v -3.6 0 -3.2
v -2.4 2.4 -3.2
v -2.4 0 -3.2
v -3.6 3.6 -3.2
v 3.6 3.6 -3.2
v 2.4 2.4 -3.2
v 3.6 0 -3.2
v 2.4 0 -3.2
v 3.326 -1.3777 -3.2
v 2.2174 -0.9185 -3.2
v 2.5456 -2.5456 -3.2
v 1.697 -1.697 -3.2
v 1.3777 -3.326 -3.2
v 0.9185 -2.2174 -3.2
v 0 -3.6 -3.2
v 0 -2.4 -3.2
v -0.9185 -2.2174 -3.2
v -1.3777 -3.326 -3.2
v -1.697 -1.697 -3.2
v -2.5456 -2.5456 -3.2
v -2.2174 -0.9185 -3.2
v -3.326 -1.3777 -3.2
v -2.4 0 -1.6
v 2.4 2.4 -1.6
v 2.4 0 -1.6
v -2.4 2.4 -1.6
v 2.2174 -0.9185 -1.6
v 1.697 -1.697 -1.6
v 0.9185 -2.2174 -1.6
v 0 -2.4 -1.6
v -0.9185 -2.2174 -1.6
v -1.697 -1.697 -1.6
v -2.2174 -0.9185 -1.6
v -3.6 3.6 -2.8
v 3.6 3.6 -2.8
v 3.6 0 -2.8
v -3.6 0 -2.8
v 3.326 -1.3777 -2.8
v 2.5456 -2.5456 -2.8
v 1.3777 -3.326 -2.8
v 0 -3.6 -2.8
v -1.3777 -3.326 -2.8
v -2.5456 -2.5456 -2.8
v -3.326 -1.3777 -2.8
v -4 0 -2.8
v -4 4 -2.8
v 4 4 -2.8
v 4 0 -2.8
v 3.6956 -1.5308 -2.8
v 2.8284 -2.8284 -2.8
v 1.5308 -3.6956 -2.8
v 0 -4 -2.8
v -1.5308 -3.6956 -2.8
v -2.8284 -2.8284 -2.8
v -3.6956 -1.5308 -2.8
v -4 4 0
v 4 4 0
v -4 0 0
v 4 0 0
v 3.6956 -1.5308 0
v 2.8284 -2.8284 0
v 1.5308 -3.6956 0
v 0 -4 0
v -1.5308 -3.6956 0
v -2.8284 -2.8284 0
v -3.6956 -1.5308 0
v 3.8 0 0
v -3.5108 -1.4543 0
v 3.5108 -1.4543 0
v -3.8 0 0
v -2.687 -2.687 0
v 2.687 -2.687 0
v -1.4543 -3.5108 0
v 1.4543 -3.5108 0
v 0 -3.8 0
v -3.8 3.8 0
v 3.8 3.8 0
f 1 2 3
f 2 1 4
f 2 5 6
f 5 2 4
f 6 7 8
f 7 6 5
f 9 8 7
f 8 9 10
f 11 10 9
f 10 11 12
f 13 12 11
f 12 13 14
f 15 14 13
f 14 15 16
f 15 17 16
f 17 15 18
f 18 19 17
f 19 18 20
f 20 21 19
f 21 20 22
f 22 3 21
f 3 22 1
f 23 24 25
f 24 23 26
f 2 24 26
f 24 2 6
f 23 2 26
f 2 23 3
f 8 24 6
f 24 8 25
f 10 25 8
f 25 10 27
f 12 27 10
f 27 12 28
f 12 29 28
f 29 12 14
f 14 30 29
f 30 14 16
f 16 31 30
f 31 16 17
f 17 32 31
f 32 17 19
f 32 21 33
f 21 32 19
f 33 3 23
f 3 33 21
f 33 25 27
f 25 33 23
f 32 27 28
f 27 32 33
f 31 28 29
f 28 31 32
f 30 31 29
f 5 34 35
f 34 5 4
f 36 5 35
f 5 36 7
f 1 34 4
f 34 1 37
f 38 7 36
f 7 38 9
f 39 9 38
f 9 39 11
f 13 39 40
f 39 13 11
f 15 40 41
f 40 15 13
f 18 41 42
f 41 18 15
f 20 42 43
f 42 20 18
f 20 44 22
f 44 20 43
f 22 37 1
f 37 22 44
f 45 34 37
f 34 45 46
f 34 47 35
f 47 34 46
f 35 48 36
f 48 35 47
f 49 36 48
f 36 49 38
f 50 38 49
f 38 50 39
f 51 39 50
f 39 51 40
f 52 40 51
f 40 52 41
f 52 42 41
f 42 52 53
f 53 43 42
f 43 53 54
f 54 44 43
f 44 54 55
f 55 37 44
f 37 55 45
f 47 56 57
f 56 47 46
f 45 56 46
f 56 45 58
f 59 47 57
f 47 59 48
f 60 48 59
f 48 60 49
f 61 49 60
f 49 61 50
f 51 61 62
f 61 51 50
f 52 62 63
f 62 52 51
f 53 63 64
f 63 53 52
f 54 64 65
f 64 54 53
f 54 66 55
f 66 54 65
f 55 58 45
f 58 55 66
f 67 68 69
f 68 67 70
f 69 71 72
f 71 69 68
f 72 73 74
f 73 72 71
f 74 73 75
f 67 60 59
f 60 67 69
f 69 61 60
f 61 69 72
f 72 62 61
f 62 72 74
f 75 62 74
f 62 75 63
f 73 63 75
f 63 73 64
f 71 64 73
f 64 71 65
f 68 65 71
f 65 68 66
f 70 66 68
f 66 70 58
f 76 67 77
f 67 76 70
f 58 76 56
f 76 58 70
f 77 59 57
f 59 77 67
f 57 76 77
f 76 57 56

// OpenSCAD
// file: ../p/2-4edge.scad
use <../lib.scad>
function ldraw_lib__2_4edge() = [
// 0 Circle 0.5
// 0 Name: 2-4edge.dat
// 0 Author: James Jessiman
// 0 !LDRAW_ORG Primitive UPDATE 2017-01
// 0 !LICENSE Licensed under CC BY 4.0 : see CAreadme.txt
// 
// 0 BFC CERTIFY CCW
  [0,"BFC","CERTIFY"],
  [0,"BFC","CCW"],
// 
// 0 !HISTORY 2007-06-24 [PTadmin] Header formatted for Contributor Agreement
// 0 !HISTORY 2008-07-01 [PTadmin] Official Update 2008-01
// 0 !HISTORY 2017-01-15 [Steffen] BFCed
// 0 !HISTORY 2017-12-30 [PTadmin] Official Update 2017-01
// 
// 
// 2 24 1 0 0 0.9239 0 0.3827
  [2,24,1,0,0,0.9239,0,0.3827],
// 2 24 0.9239 0 0.3827 0.7071 0 0.7071
  [2,24,0.9239,0,0.3827,0.7071,0,0.7071],
// 2 24 0.7071 0 0.7071 0.3827 0 0.9239
  [2,24,0.7071,0,0.7071,0.3827,0,0.9239],
// 2 24 0.3827 0 0.9239 0 0 1
  [2,24,0.3827,0,0.9239,0,0,1],
// 2 24 0 0 1 -0.3827 0 0.9239
  [2,24,0,0,1,-0.3827,0,0.9239],
// 2 24 -0.3827 0 0.9239 -0.7071 0 0.7071
  [2,24,-0.3827,0,0.9239,-0.7071,0,0.7071],
// 2 24 -0.7071 0 0.7071 -0.9239 0 0.3827
  [2,24,-0.7071,0,0.7071,-0.9239,0,0.3827],
// 2 24 -0.9239 0 0.3827 -1 0 0
  [2,24,-0.9239,0,0.3827,-1,0,0],
];
module ldraw_lib__2_4edge(step=0, col=false, unit=2/5, alt=false, line=0.2, solid=!$preview)
    makepoly(ldraw_lib__2_4edge(), step=step, col=col, unit=unit, alt=alt, line=line, solid=solid);
ldraw_lib__2_4edge(line=0.2);
// file: ../p/2-4cyli.scad
use <../lib.scad>
function ldraw_lib__2_4cyli() = [
// 0 Cylinder 0.5
// 0 Name: 2-4cyli.dat
// 0 Author: James Jessiman
// 0 !LDRAW_ORG Primitive UPDATE 2005-01
// 0 !LICENSE Licensed under CC BY 4.0 : see CAreadme.txt
// 
// 0 BFC CERTIFY CCW
  [0,"BFC","CERTIFY"],
  [0,"BFC","CCW"],
// 
// 0 !HISTORY 2002-03-23 [sbliss] Added BFC statement; compacted code
// 0 !HISTORY 2002-04-25 [PTadmin] Official Update 2002-02
// 0 !HISTORY 2004-12-11 [nielsk] Recreated using Primitive Generator, Edge lines fixed, BFC changed to CCW
// 0 !HISTORY 2005-12-28 [PTadmin] Official Update 2005-01
// 0 !HISTORY 2007-06-24 [PTadmin] Header formatted for Contributor Agreement
// 0 !HISTORY 2008-07-01 [PTadmin] Official Update 2008-01
// 
// 
// 4 16 .9239 1 .3827 .9239 0 .3827 1 0 0 1 1 0
  [4,16,.9239,1,.3827,.9239,0,.3827,1,0,0,1,1,0],
// 4 16 .7071 1 .7071 .7071 0 .7071 .9239 0 .3827 .9239 1 .3827
  [4,16,.7071,1,.7071,.7071,0,.7071,.9239,0,.3827,.9239,1,.3827],
// 4 16 .3827 1 .9239 .3827 0 .9239 .7071 0 .7071 .7071 1 .7071
  [4,16,.3827,1,.9239,.3827,0,.9239,.7071,0,.7071,.7071,1,.7071],
// 4 16 0 1 1 0 0 1 .3827 0 .9239 .3827 1 .9239
  [4,16,0,1,1,0,0,1,.3827,0,.9239,.3827,1,.9239],
// 4 16 -.3827 1 .9239 -.3827 0 .9239 0 0 1 0 1 1
  [4,16,-.3827,1,.9239,-.3827,0,.9239,0,0,1,0,1,1],
// 4 16 -.7071 1 .7071 -.7071 0 .7071 -.3827 0 .9239 -.3827 1 .9239
  [4,16,-.7071,1,.7071,-.7071,0,.7071,-.3827,0,.9239,-.3827,1,.9239],
// 4 16 -.9239 1 .3827 -.9239 0 .3827 -.7071 0 .7071 -.7071 1 .7071
  [4,16,-.9239,1,.3827,-.9239,0,.3827,-.7071,0,.7071,-.7071,1,.7071],
// 4 16 -1 1 0 -1 0 0 -.9239 0 .3827 -.9239 1 .3827
  [4,16,-1,1,0,-1,0,0,-.9239,0,.3827,-.9239,1,.3827],
// 5 24 1 1 0 1 0 0 1 1 -.4142 .9239 1 .3827
  [5,24,1,1,0,1,0,0,1,1,-.4142,.9239,1,.3827],
// 5 24 .9239 1 .3827 .9239 0 .3827 1 1 0 .7071 1 .7071
  [5,24,.9239,1,.3827,.9239,0,.3827,1,1,0,.7071,1,.7071],
// 5 24 .7071 1 .7071 .7071 0 .7071 .9239 1 .3827 .3827 1 .9239
  [5,24,.7071,1,.7071,.7071,0,.7071,.9239,1,.3827,.3827,1,.9239],
// 5 24 .3827 1 .9239 .3827 0 .9239 .7071 1 .7071 0 1 1
  [5,24,.3827,1,.9239,.3827,0,.9239,.7071,1,.7071,0,1,1],
// 5 24 0 1 1 0 0 1 .3827 1 .9239 -.3827 1 .9239
  [5,24,0,1,1,0,0,1,.3827,1,.9239,-.3827,1,.9239],
// 5 24 -.3827 1 .9239 -.3827 0 .9239 0 1 1 -.7071 1 .7071
  [5,24,-.3827,1,.9239,-.3827,0,.9239,0,1,1,-.7071,1,.7071],
// 5 24 -.7071 1 .7071 -.7071 0 .7071 -.3827 1 .9239 -.9239 1 .3827
  [5,24,-.7071,1,.7071,-.7071,0,.7071,-.3827,1,.9239,-.9239,1,.3827],
// 5 24 -.9239 1 .3827 -.9239 0 .3827 -.7071 1 .7071 -1 1 0
  [5,24,-.9239,1,.3827,-.9239,0,.3827,-.7071,1,.7071,-1,1,0],
// 5 24 -1 1 0 -1 0 0 -.9239 1 .3827 -1 1 -.4142
  [5,24,-1,1,0,-1,0,0,-.9239,1,.3827,-1,1,-.4142],
// 0
];
module ldraw_lib__2_4cyli(step=0, col=false, unit=2/5, alt=false, line=0.2, solid=!$preview)
    makepoly(ldraw_lib__2_4cyli(), step=step, col=col, unit=unit, alt=alt, line=line, solid=solid);
ldraw_lib__2_4cyli(line=0.2);
// file: ../p/box4-4a.scad
use <../lib.scad>
function ldraw_lib__box4_4a() = [
// 0 Box with  4 Faces without  4 Adjacent Edges
// 0 Name: box4-4a.dat
// 0 Author: Willy Tschager [Holly-Wood]
// 0 !LDRAW_ORG Primitive UPDATE 2024-01
// 0 !LICENSE Licensed under CC BY 4.0 : see CAreadme.txt
// 
// 0 BFC CERTIFY CCW
  [0,"BFC","CERTIFY"],
  [0,"BFC","CCW"],
// 
// 0 !HISTORY 1998-07-15 [PTadmin] Official Update 1998-07
// 0 !HISTORY 2002-12-13 [hafhead] Made BFC compliant
// 0 !HISTORY 2003-03-12 [PTadmin] Official Update 2003-01
// 0 !HISTORY 2007-06-24 [PTadmin] Header formatted for Contributor Agreement
// 0 !HISTORY 2008-07-01 [PTadmin] Official Update 2008-01
// 0 !HISTORY 2012-02-16 [Philo] Changed to CCW
// 0 !HISTORY 2012-03-30 [PTadmin] Official Update 2012-01
// 0 !HISTORY 2024-01-03 [Holly-Wood] Complete re-write, original by Manfred Moolhuysen
// 0 !HISTORY 2024-01-29 [OrionP] Official Update 2024-01
// 
// 2 24 -1 1 -1 -1 1 1
  [2,24,-1,1,-1,-1,1,1],
// 2 24 1 1 1 1 1 -1
  [2,24,1,1,1,1,1,-1],
// 2 24 -1 1 1 1 1 1
  [2,24,-1,1,1,1,1,1],
// 4 16 1 1 1 1 1 -1 -1 1 -1 -1 1 1
  [4,16,1,1,1,1,1,-1,-1,1,-1,-1,1,1],
// 
// 2 24 -1 0 -1 -1 0 1
  [2,24,-1,0,-1,-1,0,1],
// 4 16 -1 1 1 -1 1 -1 -1 0 -1 -1 0 1
  [4,16,-1,1,1,-1,1,-1,-1,0,-1,-1,0,1],
// 
// 2 24 1 0 1 1 0 -1
  [2,24,1,0,1,1,0,-1],
// 4 16 1 1 -1 1 1 1 1 0 1 1 0 -1
  [4,16,1,1,-1,1,1,1,1,0,1,1,0,-1],
// 
// 2 24 1 1 1 1 0 1
  [2,24,1,1,1,1,0,1],
// 2 24 -1 1 1 -1 0 1
  [2,24,-1,1,1,-1,0,1],
// 2 24 -1 0 1 1 0 1
  [2,24,-1,0,1,1,0,1],
// 4 16 1 1 1 -1 1 1 -1 0 1 1 0 1
  [4,16,1,1,1,-1,1,1,-1,0,1,1,0,1],
];
module ldraw_lib__box4_4a(step=0, col=false, unit=2/5, alt=false, line=0.2, solid=!$preview)
    makepoly(ldraw_lib__box4_4a(), step=step, col=col, unit=unit, alt=alt, line=line, solid=solid);
ldraw_lib__box4_4a(line=0.2);
// file: ../p/box3u4a.scad
use <../lib.scad>
function ldraw_lib__box3u4a() = [
// 0 Box with 3 Faces without 4 Adjacent Edges
// 0 Name: box3u4a.dat
// 0 Author: Niels Karsdorp [nielsk]
// 0 !LDRAW_ORG Primitive UPDATE 2009-01
// 0 !LICENSE Licensed under CC BY 4.0 : see CAreadme.txt
// 
// 0 BFC CERTIFY CCW
  [0,"BFC","CERTIFY"],
  [0,"BFC","CCW"],
// 
// 0 !HISTORY 2009-05-02 [PTadmin] Official Update 2009-01
// 
// 
// 2 24 1 1 1 -1 1 1
  [2,24,1,1,1,-1,1,1],
// 2 24 -1 1 -1 1 1 -1
  [2,24,-1,1,-1,1,1,-1],
// 2 24 1 1 1 1 1 -1
  [2,24,1,1,1,1,1,-1],
// 2 24 -1 1 1 -1 1 -1
  [2,24,-1,1,1,-1,1,-1],
// 2 24 1 1 1 1 0 1
  [2,24,1,1,1,1,0,1],
// 2 24 1 1 -1 1 0 -1
  [2,24,1,1,-1,1,0,-1],
// 2 24 -1 1 1 -1 0 1
  [2,24,-1,1,1,-1,0,1],
// 2 24 -1 1 -1 -1 0 -1
  [2,24,-1,1,-1,-1,0,-1],
// 4 16 -1 1 -1 -1 1 1 1 1 1 1 1 -1
  [4,16,-1,1,-1,-1,1,1,1,1,1,1,1,-1],
// 4 16 -1 1 1 -1 0 1 1 0 1 1 1 1
  [4,16,-1,1,1,-1,0,1,1,0,1,1,1,1],
// 4 16 1 1 -1 1 0 -1 -1 0 -1 -1 1 -1
  [4,16,1,1,-1,1,0,-1,-1,0,-1,-1,1,-1],
// 0
];
module ldraw_lib__box3u4a(step=0, col=false, unit=2/5, alt=false, line=0.2, solid=!$preview)
    makepoly(ldraw_lib__box3u4a(), step=step, col=col, unit=unit, alt=alt, line=line, solid=solid);
ldraw_lib__box3u4a(line=0.2);
// file: ../p/2-4ring9.scad
use <../lib.scad>
function ldraw_lib__2_4ring9() = [
// 0 Ring  9 x 0.5
// 0 Name: 2-4ring9.dat
// 0 Author: Willy Tschager [Holly-Wood]
// 0 !LDRAW_ORG Primitive UPDATE 2024-01
// 0 !LICENSE Licensed under CC BY 4.0 : see CAreadme.txt
// 
// 0 BFC CERTIFY CCW
  [0,"BFC","CERTIFY"],
  [0,"BFC","CCW"],
// 
// 0 !HISTORY 2009-09-03 [PTadmin] Official Update 2009-02
// 0 !HISTORY 2024-01-10 [Holly-Wood] Complete regeneration, original by guyvivan
// 0 !HISTORY 2024-01-29 [OrionP] Official Update 2024-01
// 
// 4 16 10 0 0 9.239 0 3.827 8.3151 0 3.4443 9 0 0
  [4,16,10,0,0,9.239,0,3.827,8.3151,0,3.4443,9,0,0],
// 4 16 9.239 0 3.827 7.071 0 7.071 6.3639 0 6.3639 8.3151 0 3.4443
  [4,16,9.239,0,3.827,7.071,0,7.071,6.3639,0,6.3639,8.3151,0,3.4443],
// 4 16 7.071 0 7.071 3.827 0 9.239 3.4443 0 8.3151 6.3639 0 6.3639
  [4,16,7.071,0,7.071,3.827,0,9.239,3.4443,0,8.3151,6.3639,0,6.3639],
// 4 16 3.827 0 9.239 0 0 10 0 0 9 3.4443 0 8.3151
  [4,16,3.827,0,9.239,0,0,10,0,0,9,3.4443,0,8.3151],
// 4 16 0 0 10 -3.827 0 9.239 -3.4443 0 8.3151 0 0 9
  [4,16,0,0,10,-3.827,0,9.239,-3.4443,0,8.3151,0,0,9],
// 4 16 -3.827 0 9.239 -7.071 0 7.071 -6.3639 0 6.3639 -3.4443 0 8.3151
  [4,16,-3.827,0,9.239,-7.071,0,7.071,-6.3639,0,6.3639,-3.4443,0,8.3151],
// 4 16 -7.071 0 7.071 -9.239 0 3.827 -8.3151 0 3.4443 -6.3639 0 6.3639
  [4,16,-7.071,0,7.071,-9.239,0,3.827,-8.3151,0,3.4443,-6.3639,0,6.3639],
// 4 16 -9.239 0 3.827 -10 0 0 -9 0 0 -8.3151 0 3.4443
  [4,16,-9.239,0,3.827,-10,0,0,-9,0,0,-8.3151,0,3.4443],
// 0 // Build by LDPartEditor (PrimGen 2.X)
];
module ldraw_lib__2_4ring9(step=0, col=false, unit=2/5, alt=false, line=0.2, solid=!$preview)
    makepoly(ldraw_lib__2_4ring9(), step=step, col=col, unit=unit, alt=alt, line=line, solid=solid);
ldraw_lib__2_4ring9(line=0.2);
// file: ../p/2-4ring2.scad
use <../lib.scad>
function ldraw_lib__2_4ring2() = [
// 0 Ring  2 x 0.5
// 0 Name: 2-4ring2.dat
// 0 Author: Chris Dee [cwdee]
// 0 !LDRAW_ORG Primitive UPDATE 2012-01
// 0 !LICENSE Licensed under CC BY 4.0 : see CAreadme.txt
// 
// 0 BFC CERTIFY CCW
  [0,"BFC","CERTIFY"],
  [0,"BFC","CCW"],
// 
// 0 !HISTORY 2001-10-26 [PTadmin] Official Update 2001-01
// 0 !HISTORY 2007-06-24 [PTadmin] Header formatted for Contributor Agreement
// 0 !HISTORY 2008-07-01 [PTadmin] Official Update 2008-01
// 0 !HISTORY 2012-02-16 [Philo] Changed to CCW
// 0 !HISTORY 2012-03-30 [PTadmin] Official Update 2012-01
// 
// 
// 4 16 3 0 0 2.7717 0 1.1481 1.8478 0 0.7654 2 0 0
  [4,16,3,0,0,2.7717,0,1.1481,1.8478,0,0.7654,2,0,0],
// 4 16 2.7717 0 1.1481 2.1213 0 2.1213 1.4142 0 1.4142 1.8478 0 0.7654
  [4,16,2.7717,0,1.1481,2.1213,0,2.1213,1.4142,0,1.4142,1.8478,0,0.7654],
// 4 16 2.1213 0 2.1213 1.1481 0 2.7717 0.7654 0 1.8478 1.4142 0 1.4142
  [4,16,2.1213,0,2.1213,1.1481,0,2.7717,0.7654,0,1.8478,1.4142,0,1.4142],
// 4 16 1.1481 0 2.7717 0 0 3 0 0 2 0.7654 0 1.8478
  [4,16,1.1481,0,2.7717,0,0,3,0,0,2,0.7654,0,1.8478],
// 4 16 0 0 3 -1.1481 0 2.7717 -0.7654 0 1.8478 0 0 2
  [4,16,0,0,3,-1.1481,0,2.7717,-0.7654,0,1.8478,0,0,2],
// 4 16 -1.1481 0 2.7717 -2.1213 0 2.1213 -1.4142 0 1.4142 -0.7654 0 1.8478
  [4,16,-1.1481,0,2.7717,-2.1213,0,2.1213,-1.4142,0,1.4142,-0.7654,0,1.8478],
// 4 16 -2.1213 0 2.1213 -2.7717 0 1.1481 -1.8478 0 0.7654 -1.4142 0 1.4142
  [4,16,-2.1213,0,2.1213,-2.7717,0,1.1481,-1.8478,0,0.7654,-1.4142,0,1.4142],
// 4 16 -2.7717 0 1.1481 -3 0 0 -2 0 0 -1.8478 0 0.7654
  [4,16,-2.7717,0,1.1481,-3,0,0,-2,0,0,-1.8478,0,0.7654],
];
module ldraw_lib__2_4ring2(step=0, col=false, unit=2/5, alt=false, line=0.2, solid=!$preview)
    makepoly(ldraw_lib__2_4ring2(), step=step, col=col, unit=unit, alt=alt, line=line, solid=solid);
ldraw_lib__2_4ring2(line=0.2);
// file: ../p/2-4cylo.scad
use <../lib.scad>
use <2-4cyli.scad>
use <2-4edge.scad>
function ldraw_lib__2_4cylo() = [
// 0 Cylinder Open 0.5
// 0 Name: 2-4cylo.dat
// 0 Author: Max Martin Richter [MMR1988]
// 0 !LDRAW_ORG Primitive UPDATE 2010-03
// 0 !LICENSE Licensed under CC BY 4.0 : see CAreadme.txt
// 
// 0 BFC CERTIFY CCW
  [0,"BFC","CERTIFY"],
  [0,"BFC","CCW"],
// 
// 0 !HISTORY 2010-12-31 [PTadmin] Official Update 2010-03
// 
// 
// 1 16 0 0 0 1 0 0 0 1 0 0 0 1 2-4edge.dat
  [1,16,0,0,0,1,0,0,0,1,0,0,0,1, ldraw_lib__2_4edge()],
// 1 16 0 1 0 1 0 0 0 1 0 0 0 1 2-4edge.dat
  [1,16,0,1,0,1,0,0,0,1,0,0,0,1, ldraw_lib__2_4edge()],
// 1 16 0 0 0 1 0 0 0 1 0 0 0 1 2-4cyli.dat
  [1,16,0,0,0,1,0,0,0,1,0,0,0,1, ldraw_lib__2_4cyli()],
];
module ldraw_lib__2_4cylo(step=0, col=false, unit=2/5, alt=false, line=0.2, solid=!$preview)
    makepoly(ldraw_lib__2_4cylo(), step=step, col=col, unit=unit, alt=alt, line=line, solid=solid);
ldraw_lib__2_4cylo(line=0.2);
// file: s/24246s02.scad
use <../../lib.scad>
use <../../p/2-4chrd.scad>
use <../../p/2-4cylo.scad>
use <../../p/2-4ring2.scad>
use <../../p/2-4ring9.scad>
use <../../p/box3u4a.scad>
use <../../p/box4-4a.scad>
function ldraw_lib__s__24246s02() = [
// 0 ~Tile  1 x  1 with Rounded End without Complete Top Face
// 0 Name: s\24246s02.dat
// 0 Author: Magnus Forsberg [MagFors]
// 0 !LDRAW_ORG Subpart UPDATE 2020-02
// 0 !LICENSE Licensed under CC BY 4.0 : see CAreadme.txt
// 
// 0 BFC CERTIFY CCW
  [0,"BFC","CERTIFY"],
  [0,"BFC","CCW"],
// 
// 0 !HISTORY 2020-09-05 [PTadmin] Official Update 2020-02
// 
// 
// 4 16 -9 8 0 -9 8 9 -6 8 6 -6 8 0
  [4,16,-9,8,0,-9,8,9,-6,8,6,-6,8,0],
// 4 16 -9 8 9 9 8 9 6 8 6 -6 8 6
  [4,16,-9,8,9,9,8,9,6,8,6,-6,8,6],
// 4 16 9 8 9 9 8 0 6 8 0 6 8 6
  [4,16,9,8,9,9,8,0,6,8,0,6,8,6],
// 1 16 0 8 0 3 0 0 0 -1 0 0 0 -3 2-4ring2.dat
  [1,16,0,8,0,3,0,0,0,-1,0,0,0,-3, ldraw_lib__2_4ring2()],
// 0 BFC INVERTNEXT
  [0,"BFC","INVERTNEXT"],
// 1 16 0 8 3 6 0 0 0 -4 0 0 0 3 box4-4a.dat
  [1,16,0,8,3,6,0,0,0,-4,0,0,0,3, ldraw_lib__box4_4a()],
// 0 BFC INVERTNEXT
  [0,"BFC","INVERTNEXT"],
// 1 16 0 4 0 6 0 0 0 4 0 0 0 -6 2-4cylo.dat
  [1,16,0,4,0,6,0,0,0,4,0,0,0,-6, ldraw_lib__2_4cylo()],
// 1 16 0 4 0 6 0 0 0 -4 0 0 0 -6 2-4chrd.dat
  [1,16,0,4,0,6,0,0,0,-4,0,0,0,-6, ldraw_lib__2_4chrd()],
// 1 16 0 7.5 0 0 0 9 0.5 0 0 0 9 0 box3u4a.dat
  [1,16,0,7.5,0,0,0,9,0.5,0,0,0,9,0, ldraw_lib__box3u4a()],
// 1 16 0 7 0 9 0 0 0 1 0 0 0 -9 2-4cylo.dat
  [1,16,0,7,0,9,0,0,0,1,0,0,0,-9, ldraw_lib__2_4cylo()],
// 4 16 -10 7 0 -10 7 10 -9 7 9 -9 7 0
  [4,16,-10,7,0,-10,7,10,-9,7,9,-9,7,0],
// 4 16 -10 7 10 10 7 10 9 7 9 -9 7 9
  [4,16,-10,7,10,10,7,10,9,7,9,-9,7,9],
// 4 16 10 7 10 10 7 0 9 7 0 9 7 9
  [4,16,10,7,10,10,7,0,9,7,0,9,7,9],
// 1 16 0 7 0 1 0 0 0 -1 0 0 0 -1 2-4ring9.dat
  [1,16,0,7,0,1,0,0,0,-1,0,0,0,-1, ldraw_lib__2_4ring9()],
// 1 16 0 3.5 0 0 0 -10 -3.5 0 0 0 10 0 box3u4a.dat
  [1,16,0,3.5,0,0,0,-10,-3.5,0,0,0,10,0, ldraw_lib__box3u4a()],
// 1 16 0 0 0 10 0 0 0 7 0 0 0 -10 2-4cylo.dat
  [1,16,0,0,0,10,0,0,0,7,0,0,0,-10, ldraw_lib__2_4cylo()],
];
module ldraw_lib__s__24246s02(step=0, col=false, unit=2/5, alt=false, line=0.2, solid=!$preview)
    makepoly(ldraw_lib__s__24246s02(), step=step, col=col, unit=unit, alt=alt, line=line, solid=solid);
ldraw_lib__s__24246s02(line=0.2);
// file: ../p/2-4ring19.scad
use <../lib.scad>
function ldraw_lib__2_4ring19() = [
// 0 Ring 19 x 0.5
// 0 Name: 2-4ring19.dat
// 0 Author: Willy Tschager [Holly-Wood]
// 0 !LDRAW_ORG Primitive UPDATE 2024-02
// 0 !LICENSE Licensed under CC BY 4.0 : see CAreadme.txt
// 
// 0 BFC CERTIFY CCW
  [0,"BFC","CERTIFY"],
  [0,"BFC","CCW"],
// 
// 0 !HISTORY 2016-12-31 [PTadmin] Official Update 2016-01
// 0 !HISTORY 2024-02-06 [Holly-Wood] Complete regeneration, original by KROACH
// 0 !HISTORY 2024-03-24 [OrionP] Official Update 2024-02
// 
// 4 16 20 0 0 18.478 0 7.654 17.5541 0 7.2713 19 0 0
  [4,16,20,0,0,18.478,0,7.654,17.5541,0,7.2713,19,0,0],
// 4 16 18.478 0 7.654 14.142 0 14.142 13.4349 0 13.4349 17.5541 0 7.2713
  [4,16,18.478,0,7.654,14.142,0,14.142,13.4349,0,13.4349,17.5541,0,7.2713],
// 4 16 14.142 0 14.142 7.654 0 18.478 7.2713 0 17.5541 13.4349 0 13.4349
  [4,16,14.142,0,14.142,7.654,0,18.478,7.2713,0,17.5541,13.4349,0,13.4349],
// 4 16 7.654 0 18.478 0 0 20 0 0 19 7.2713 0 17.5541
  [4,16,7.654,0,18.478,0,0,20,0,0,19,7.2713,0,17.5541],
// 4 16 0 0 20 -7.654 0 18.478 -7.2713 0 17.5541 0 0 19
  [4,16,0,0,20,-7.654,0,18.478,-7.2713,0,17.5541,0,0,19],
// 4 16 -7.654 0 18.478 -14.142 0 14.142 -13.4349 0 13.4349 -7.2713 0 17.5541
  [4,16,-7.654,0,18.478,-14.142,0,14.142,-13.4349,0,13.4349,-7.2713,0,17.5541],
// 4 16 -14.142 0 14.142 -18.478 0 7.654 -17.5541 0 7.2713 -13.4349 0 13.4349
  [4,16,-14.142,0,14.142,-18.478,0,7.654,-17.5541,0,7.2713,-13.4349,0,13.4349],
// 4 16 -18.478 0 7.654 -20 0 0 -19 0 0 -17.5541 0 7.2713
  [4,16,-18.478,0,7.654,-20,0,0,-19,0,0,-17.5541,0,7.2713],
// 0 // Build by LDPartEditor (PrimGen 2.X)
];
module ldraw_lib__2_4ring19(step=0, col=false, unit=2/5, alt=false, line=0.2, solid=!$preview)
    makepoly(ldraw_lib__2_4ring19(), step=step, col=col, unit=unit, alt=alt, line=line, solid=solid);
ldraw_lib__2_4ring19(line=0.2);
// file: ../p/2-4chrd.scad
use <../lib.scad>
function ldraw_lib__2_4chrd() = [
// 0 Chord 0.5
// 0 Name: 2-4chrd.dat
// 0 Author: Philippe Hurbain [Philo]
// 0 !LDRAW_ORG Primitive UPDATE 2014-01
// 0 !LICENSE Licensed under CC BY 4.0 : see CAreadme.txt
// 
// 0 BFC CERTIFY CCW
  [0,"BFC","CERTIFY"],
  [0,"BFC","CCW"],
// 
// 0 !HISTORY 2014-06-21 [PTadmin] Official Update 2014-01
// 
// 
// 4 16 0.9239 0 0.3827 -0.9239 0 0.3827 -1 0 0 1 0 0
  [4,16,0.9239,0,0.3827,-0.9239,0,0.3827,-1,0,0,1,0,0],
// 4 16 0.7071 0 0.7071 -0.7071 0 0.7071 -0.9239 0 0.3827 0.9239 0 0.3827
  [4,16,0.7071,0,0.7071,-0.7071,0,0.7071,-0.9239,0,0.3827,0.9239,0,0.3827],
// 4 16 0.3827 0 0.9239 -0.3827 0 0.9239 -0.7071 0 0.7071 0.7071 0 0.7071
  [4,16,0.3827,0,0.9239,-0.3827,0,0.9239,-0.7071,0,0.7071,0.7071,0,0.7071],
// 3 16 0 0 1 -0.3827 0 0.9239 0.3827 0 0.9239
  [3,16,0,0,1,-0.3827,0,0.9239,0.3827,0,0.9239],
];
module ldraw_lib__2_4chrd(step=0, col=false, unit=2/5, alt=false, line=0.2, solid=!$preview)
    makepoly(ldraw_lib__2_4chrd(), step=step, col=col, unit=unit, alt=alt, line=line, solid=solid);
ldraw_lib__2_4chrd(line=0.2);
// main file
use <../lib.scad>
use <../p/2-4chrd.scad>
use <../p/2-4ring19.scad>
use <s/24246s02.scad>
function ldraw_lib__24246p03() = [
// 0 Tile  1 x  1 with Rounded End with Black Top Pattern
// 0 Name: 24246p03.dat
// 0 Author: Massimo Maso [Sirio]
// 0 !LDRAW_ORG Part UPDATE 2025-02
// 0 !LICENSE Licensed under CC BY 4.0 : see CAreadme.txt
// 
// 0 BFC CERTIFY CCW
  [0,"BFC","CERTIFY"],
  [0,"BFC","CCW"],
// 
// 0 !KEYWORDS Bricklink 24246pb042, F1, Mercedes, Rebrickable 24246pr0035
// 0 !KEYWORDS Set 76909, Speed Champions
// 
// 0 !HISTORY 2022-09-15 [PTadmin] Official Update 2022-05
// 0 !HISTORY 2025-02-27 [Lego-Manfred] References added
// 0 !HISTORY 2025-02-27 [OrionP] Official Update 2025-02
// 
// 0 // Subpart
// 1 16 0 0 0 1 0 0 0 1 0 0 0 1 s\24246s02.dat
  [1,16,0,0,0,1,0,0,0,1,0,0,0,1, ldraw_lib__s__24246s02()],
// 0 // Upper face
// 0 // Primitives
// 1 0 0 0 0 9.5 0 0 0 1 0 0 0 -9.5 2-4chrd.dat
  [1,0,0,0,0,9.5,0,0,0,1,0,0,0,-9.5, ldraw_lib__2_4chrd()],
// 1 16 0 0 0 .5 0 0 0 1 0 0 0 -.5 2-4ring19.dat
  [1,16,0,0,0,.5,0,0,0,1,0,0,0,-.5, ldraw_lib__2_4ring19()],
// 0 // Black faces
// 4 0 -9.5 0 9.5 -9.5 0 0 9.5 0 0 9.5 0 9.5
  [4,0,-9.5,0,9.5,-9.5,0,0,9.5,0,0,9.5,0,9.5],
// 0 // Neutral faces
// 4 16 -9.5 0 9.5 -10 0 10 -10 0 0 -9.5 0 0
  [4,16,-9.5,0,9.5,-10,0,10,-10,0,0,-9.5,0,0],
// 4 16 9.5 0 9.5 9.5 0 0 10 0 0 10 0 10
  [4,16,9.5,0,9.5,9.5,0,0,10,0,0,10,0,10],
// 4 16 -9.5 0 9.5 9.5 0 9.5 10 0 10 -10 0 10
  [4,16,-9.5,0,9.5,9.5,0,9.5,10,0,10,-10,0,10],
];
module ldraw_lib__24246p03(step=0, col=false, unit=2/5, alt=false, line=0.2, solid=!$preview)
    makepoly(ldraw_lib__24246p03(), step=step, col=col, unit=unit, alt=alt, line=line, solid=solid);
ldraw_lib__24246p03(line=0.2);
